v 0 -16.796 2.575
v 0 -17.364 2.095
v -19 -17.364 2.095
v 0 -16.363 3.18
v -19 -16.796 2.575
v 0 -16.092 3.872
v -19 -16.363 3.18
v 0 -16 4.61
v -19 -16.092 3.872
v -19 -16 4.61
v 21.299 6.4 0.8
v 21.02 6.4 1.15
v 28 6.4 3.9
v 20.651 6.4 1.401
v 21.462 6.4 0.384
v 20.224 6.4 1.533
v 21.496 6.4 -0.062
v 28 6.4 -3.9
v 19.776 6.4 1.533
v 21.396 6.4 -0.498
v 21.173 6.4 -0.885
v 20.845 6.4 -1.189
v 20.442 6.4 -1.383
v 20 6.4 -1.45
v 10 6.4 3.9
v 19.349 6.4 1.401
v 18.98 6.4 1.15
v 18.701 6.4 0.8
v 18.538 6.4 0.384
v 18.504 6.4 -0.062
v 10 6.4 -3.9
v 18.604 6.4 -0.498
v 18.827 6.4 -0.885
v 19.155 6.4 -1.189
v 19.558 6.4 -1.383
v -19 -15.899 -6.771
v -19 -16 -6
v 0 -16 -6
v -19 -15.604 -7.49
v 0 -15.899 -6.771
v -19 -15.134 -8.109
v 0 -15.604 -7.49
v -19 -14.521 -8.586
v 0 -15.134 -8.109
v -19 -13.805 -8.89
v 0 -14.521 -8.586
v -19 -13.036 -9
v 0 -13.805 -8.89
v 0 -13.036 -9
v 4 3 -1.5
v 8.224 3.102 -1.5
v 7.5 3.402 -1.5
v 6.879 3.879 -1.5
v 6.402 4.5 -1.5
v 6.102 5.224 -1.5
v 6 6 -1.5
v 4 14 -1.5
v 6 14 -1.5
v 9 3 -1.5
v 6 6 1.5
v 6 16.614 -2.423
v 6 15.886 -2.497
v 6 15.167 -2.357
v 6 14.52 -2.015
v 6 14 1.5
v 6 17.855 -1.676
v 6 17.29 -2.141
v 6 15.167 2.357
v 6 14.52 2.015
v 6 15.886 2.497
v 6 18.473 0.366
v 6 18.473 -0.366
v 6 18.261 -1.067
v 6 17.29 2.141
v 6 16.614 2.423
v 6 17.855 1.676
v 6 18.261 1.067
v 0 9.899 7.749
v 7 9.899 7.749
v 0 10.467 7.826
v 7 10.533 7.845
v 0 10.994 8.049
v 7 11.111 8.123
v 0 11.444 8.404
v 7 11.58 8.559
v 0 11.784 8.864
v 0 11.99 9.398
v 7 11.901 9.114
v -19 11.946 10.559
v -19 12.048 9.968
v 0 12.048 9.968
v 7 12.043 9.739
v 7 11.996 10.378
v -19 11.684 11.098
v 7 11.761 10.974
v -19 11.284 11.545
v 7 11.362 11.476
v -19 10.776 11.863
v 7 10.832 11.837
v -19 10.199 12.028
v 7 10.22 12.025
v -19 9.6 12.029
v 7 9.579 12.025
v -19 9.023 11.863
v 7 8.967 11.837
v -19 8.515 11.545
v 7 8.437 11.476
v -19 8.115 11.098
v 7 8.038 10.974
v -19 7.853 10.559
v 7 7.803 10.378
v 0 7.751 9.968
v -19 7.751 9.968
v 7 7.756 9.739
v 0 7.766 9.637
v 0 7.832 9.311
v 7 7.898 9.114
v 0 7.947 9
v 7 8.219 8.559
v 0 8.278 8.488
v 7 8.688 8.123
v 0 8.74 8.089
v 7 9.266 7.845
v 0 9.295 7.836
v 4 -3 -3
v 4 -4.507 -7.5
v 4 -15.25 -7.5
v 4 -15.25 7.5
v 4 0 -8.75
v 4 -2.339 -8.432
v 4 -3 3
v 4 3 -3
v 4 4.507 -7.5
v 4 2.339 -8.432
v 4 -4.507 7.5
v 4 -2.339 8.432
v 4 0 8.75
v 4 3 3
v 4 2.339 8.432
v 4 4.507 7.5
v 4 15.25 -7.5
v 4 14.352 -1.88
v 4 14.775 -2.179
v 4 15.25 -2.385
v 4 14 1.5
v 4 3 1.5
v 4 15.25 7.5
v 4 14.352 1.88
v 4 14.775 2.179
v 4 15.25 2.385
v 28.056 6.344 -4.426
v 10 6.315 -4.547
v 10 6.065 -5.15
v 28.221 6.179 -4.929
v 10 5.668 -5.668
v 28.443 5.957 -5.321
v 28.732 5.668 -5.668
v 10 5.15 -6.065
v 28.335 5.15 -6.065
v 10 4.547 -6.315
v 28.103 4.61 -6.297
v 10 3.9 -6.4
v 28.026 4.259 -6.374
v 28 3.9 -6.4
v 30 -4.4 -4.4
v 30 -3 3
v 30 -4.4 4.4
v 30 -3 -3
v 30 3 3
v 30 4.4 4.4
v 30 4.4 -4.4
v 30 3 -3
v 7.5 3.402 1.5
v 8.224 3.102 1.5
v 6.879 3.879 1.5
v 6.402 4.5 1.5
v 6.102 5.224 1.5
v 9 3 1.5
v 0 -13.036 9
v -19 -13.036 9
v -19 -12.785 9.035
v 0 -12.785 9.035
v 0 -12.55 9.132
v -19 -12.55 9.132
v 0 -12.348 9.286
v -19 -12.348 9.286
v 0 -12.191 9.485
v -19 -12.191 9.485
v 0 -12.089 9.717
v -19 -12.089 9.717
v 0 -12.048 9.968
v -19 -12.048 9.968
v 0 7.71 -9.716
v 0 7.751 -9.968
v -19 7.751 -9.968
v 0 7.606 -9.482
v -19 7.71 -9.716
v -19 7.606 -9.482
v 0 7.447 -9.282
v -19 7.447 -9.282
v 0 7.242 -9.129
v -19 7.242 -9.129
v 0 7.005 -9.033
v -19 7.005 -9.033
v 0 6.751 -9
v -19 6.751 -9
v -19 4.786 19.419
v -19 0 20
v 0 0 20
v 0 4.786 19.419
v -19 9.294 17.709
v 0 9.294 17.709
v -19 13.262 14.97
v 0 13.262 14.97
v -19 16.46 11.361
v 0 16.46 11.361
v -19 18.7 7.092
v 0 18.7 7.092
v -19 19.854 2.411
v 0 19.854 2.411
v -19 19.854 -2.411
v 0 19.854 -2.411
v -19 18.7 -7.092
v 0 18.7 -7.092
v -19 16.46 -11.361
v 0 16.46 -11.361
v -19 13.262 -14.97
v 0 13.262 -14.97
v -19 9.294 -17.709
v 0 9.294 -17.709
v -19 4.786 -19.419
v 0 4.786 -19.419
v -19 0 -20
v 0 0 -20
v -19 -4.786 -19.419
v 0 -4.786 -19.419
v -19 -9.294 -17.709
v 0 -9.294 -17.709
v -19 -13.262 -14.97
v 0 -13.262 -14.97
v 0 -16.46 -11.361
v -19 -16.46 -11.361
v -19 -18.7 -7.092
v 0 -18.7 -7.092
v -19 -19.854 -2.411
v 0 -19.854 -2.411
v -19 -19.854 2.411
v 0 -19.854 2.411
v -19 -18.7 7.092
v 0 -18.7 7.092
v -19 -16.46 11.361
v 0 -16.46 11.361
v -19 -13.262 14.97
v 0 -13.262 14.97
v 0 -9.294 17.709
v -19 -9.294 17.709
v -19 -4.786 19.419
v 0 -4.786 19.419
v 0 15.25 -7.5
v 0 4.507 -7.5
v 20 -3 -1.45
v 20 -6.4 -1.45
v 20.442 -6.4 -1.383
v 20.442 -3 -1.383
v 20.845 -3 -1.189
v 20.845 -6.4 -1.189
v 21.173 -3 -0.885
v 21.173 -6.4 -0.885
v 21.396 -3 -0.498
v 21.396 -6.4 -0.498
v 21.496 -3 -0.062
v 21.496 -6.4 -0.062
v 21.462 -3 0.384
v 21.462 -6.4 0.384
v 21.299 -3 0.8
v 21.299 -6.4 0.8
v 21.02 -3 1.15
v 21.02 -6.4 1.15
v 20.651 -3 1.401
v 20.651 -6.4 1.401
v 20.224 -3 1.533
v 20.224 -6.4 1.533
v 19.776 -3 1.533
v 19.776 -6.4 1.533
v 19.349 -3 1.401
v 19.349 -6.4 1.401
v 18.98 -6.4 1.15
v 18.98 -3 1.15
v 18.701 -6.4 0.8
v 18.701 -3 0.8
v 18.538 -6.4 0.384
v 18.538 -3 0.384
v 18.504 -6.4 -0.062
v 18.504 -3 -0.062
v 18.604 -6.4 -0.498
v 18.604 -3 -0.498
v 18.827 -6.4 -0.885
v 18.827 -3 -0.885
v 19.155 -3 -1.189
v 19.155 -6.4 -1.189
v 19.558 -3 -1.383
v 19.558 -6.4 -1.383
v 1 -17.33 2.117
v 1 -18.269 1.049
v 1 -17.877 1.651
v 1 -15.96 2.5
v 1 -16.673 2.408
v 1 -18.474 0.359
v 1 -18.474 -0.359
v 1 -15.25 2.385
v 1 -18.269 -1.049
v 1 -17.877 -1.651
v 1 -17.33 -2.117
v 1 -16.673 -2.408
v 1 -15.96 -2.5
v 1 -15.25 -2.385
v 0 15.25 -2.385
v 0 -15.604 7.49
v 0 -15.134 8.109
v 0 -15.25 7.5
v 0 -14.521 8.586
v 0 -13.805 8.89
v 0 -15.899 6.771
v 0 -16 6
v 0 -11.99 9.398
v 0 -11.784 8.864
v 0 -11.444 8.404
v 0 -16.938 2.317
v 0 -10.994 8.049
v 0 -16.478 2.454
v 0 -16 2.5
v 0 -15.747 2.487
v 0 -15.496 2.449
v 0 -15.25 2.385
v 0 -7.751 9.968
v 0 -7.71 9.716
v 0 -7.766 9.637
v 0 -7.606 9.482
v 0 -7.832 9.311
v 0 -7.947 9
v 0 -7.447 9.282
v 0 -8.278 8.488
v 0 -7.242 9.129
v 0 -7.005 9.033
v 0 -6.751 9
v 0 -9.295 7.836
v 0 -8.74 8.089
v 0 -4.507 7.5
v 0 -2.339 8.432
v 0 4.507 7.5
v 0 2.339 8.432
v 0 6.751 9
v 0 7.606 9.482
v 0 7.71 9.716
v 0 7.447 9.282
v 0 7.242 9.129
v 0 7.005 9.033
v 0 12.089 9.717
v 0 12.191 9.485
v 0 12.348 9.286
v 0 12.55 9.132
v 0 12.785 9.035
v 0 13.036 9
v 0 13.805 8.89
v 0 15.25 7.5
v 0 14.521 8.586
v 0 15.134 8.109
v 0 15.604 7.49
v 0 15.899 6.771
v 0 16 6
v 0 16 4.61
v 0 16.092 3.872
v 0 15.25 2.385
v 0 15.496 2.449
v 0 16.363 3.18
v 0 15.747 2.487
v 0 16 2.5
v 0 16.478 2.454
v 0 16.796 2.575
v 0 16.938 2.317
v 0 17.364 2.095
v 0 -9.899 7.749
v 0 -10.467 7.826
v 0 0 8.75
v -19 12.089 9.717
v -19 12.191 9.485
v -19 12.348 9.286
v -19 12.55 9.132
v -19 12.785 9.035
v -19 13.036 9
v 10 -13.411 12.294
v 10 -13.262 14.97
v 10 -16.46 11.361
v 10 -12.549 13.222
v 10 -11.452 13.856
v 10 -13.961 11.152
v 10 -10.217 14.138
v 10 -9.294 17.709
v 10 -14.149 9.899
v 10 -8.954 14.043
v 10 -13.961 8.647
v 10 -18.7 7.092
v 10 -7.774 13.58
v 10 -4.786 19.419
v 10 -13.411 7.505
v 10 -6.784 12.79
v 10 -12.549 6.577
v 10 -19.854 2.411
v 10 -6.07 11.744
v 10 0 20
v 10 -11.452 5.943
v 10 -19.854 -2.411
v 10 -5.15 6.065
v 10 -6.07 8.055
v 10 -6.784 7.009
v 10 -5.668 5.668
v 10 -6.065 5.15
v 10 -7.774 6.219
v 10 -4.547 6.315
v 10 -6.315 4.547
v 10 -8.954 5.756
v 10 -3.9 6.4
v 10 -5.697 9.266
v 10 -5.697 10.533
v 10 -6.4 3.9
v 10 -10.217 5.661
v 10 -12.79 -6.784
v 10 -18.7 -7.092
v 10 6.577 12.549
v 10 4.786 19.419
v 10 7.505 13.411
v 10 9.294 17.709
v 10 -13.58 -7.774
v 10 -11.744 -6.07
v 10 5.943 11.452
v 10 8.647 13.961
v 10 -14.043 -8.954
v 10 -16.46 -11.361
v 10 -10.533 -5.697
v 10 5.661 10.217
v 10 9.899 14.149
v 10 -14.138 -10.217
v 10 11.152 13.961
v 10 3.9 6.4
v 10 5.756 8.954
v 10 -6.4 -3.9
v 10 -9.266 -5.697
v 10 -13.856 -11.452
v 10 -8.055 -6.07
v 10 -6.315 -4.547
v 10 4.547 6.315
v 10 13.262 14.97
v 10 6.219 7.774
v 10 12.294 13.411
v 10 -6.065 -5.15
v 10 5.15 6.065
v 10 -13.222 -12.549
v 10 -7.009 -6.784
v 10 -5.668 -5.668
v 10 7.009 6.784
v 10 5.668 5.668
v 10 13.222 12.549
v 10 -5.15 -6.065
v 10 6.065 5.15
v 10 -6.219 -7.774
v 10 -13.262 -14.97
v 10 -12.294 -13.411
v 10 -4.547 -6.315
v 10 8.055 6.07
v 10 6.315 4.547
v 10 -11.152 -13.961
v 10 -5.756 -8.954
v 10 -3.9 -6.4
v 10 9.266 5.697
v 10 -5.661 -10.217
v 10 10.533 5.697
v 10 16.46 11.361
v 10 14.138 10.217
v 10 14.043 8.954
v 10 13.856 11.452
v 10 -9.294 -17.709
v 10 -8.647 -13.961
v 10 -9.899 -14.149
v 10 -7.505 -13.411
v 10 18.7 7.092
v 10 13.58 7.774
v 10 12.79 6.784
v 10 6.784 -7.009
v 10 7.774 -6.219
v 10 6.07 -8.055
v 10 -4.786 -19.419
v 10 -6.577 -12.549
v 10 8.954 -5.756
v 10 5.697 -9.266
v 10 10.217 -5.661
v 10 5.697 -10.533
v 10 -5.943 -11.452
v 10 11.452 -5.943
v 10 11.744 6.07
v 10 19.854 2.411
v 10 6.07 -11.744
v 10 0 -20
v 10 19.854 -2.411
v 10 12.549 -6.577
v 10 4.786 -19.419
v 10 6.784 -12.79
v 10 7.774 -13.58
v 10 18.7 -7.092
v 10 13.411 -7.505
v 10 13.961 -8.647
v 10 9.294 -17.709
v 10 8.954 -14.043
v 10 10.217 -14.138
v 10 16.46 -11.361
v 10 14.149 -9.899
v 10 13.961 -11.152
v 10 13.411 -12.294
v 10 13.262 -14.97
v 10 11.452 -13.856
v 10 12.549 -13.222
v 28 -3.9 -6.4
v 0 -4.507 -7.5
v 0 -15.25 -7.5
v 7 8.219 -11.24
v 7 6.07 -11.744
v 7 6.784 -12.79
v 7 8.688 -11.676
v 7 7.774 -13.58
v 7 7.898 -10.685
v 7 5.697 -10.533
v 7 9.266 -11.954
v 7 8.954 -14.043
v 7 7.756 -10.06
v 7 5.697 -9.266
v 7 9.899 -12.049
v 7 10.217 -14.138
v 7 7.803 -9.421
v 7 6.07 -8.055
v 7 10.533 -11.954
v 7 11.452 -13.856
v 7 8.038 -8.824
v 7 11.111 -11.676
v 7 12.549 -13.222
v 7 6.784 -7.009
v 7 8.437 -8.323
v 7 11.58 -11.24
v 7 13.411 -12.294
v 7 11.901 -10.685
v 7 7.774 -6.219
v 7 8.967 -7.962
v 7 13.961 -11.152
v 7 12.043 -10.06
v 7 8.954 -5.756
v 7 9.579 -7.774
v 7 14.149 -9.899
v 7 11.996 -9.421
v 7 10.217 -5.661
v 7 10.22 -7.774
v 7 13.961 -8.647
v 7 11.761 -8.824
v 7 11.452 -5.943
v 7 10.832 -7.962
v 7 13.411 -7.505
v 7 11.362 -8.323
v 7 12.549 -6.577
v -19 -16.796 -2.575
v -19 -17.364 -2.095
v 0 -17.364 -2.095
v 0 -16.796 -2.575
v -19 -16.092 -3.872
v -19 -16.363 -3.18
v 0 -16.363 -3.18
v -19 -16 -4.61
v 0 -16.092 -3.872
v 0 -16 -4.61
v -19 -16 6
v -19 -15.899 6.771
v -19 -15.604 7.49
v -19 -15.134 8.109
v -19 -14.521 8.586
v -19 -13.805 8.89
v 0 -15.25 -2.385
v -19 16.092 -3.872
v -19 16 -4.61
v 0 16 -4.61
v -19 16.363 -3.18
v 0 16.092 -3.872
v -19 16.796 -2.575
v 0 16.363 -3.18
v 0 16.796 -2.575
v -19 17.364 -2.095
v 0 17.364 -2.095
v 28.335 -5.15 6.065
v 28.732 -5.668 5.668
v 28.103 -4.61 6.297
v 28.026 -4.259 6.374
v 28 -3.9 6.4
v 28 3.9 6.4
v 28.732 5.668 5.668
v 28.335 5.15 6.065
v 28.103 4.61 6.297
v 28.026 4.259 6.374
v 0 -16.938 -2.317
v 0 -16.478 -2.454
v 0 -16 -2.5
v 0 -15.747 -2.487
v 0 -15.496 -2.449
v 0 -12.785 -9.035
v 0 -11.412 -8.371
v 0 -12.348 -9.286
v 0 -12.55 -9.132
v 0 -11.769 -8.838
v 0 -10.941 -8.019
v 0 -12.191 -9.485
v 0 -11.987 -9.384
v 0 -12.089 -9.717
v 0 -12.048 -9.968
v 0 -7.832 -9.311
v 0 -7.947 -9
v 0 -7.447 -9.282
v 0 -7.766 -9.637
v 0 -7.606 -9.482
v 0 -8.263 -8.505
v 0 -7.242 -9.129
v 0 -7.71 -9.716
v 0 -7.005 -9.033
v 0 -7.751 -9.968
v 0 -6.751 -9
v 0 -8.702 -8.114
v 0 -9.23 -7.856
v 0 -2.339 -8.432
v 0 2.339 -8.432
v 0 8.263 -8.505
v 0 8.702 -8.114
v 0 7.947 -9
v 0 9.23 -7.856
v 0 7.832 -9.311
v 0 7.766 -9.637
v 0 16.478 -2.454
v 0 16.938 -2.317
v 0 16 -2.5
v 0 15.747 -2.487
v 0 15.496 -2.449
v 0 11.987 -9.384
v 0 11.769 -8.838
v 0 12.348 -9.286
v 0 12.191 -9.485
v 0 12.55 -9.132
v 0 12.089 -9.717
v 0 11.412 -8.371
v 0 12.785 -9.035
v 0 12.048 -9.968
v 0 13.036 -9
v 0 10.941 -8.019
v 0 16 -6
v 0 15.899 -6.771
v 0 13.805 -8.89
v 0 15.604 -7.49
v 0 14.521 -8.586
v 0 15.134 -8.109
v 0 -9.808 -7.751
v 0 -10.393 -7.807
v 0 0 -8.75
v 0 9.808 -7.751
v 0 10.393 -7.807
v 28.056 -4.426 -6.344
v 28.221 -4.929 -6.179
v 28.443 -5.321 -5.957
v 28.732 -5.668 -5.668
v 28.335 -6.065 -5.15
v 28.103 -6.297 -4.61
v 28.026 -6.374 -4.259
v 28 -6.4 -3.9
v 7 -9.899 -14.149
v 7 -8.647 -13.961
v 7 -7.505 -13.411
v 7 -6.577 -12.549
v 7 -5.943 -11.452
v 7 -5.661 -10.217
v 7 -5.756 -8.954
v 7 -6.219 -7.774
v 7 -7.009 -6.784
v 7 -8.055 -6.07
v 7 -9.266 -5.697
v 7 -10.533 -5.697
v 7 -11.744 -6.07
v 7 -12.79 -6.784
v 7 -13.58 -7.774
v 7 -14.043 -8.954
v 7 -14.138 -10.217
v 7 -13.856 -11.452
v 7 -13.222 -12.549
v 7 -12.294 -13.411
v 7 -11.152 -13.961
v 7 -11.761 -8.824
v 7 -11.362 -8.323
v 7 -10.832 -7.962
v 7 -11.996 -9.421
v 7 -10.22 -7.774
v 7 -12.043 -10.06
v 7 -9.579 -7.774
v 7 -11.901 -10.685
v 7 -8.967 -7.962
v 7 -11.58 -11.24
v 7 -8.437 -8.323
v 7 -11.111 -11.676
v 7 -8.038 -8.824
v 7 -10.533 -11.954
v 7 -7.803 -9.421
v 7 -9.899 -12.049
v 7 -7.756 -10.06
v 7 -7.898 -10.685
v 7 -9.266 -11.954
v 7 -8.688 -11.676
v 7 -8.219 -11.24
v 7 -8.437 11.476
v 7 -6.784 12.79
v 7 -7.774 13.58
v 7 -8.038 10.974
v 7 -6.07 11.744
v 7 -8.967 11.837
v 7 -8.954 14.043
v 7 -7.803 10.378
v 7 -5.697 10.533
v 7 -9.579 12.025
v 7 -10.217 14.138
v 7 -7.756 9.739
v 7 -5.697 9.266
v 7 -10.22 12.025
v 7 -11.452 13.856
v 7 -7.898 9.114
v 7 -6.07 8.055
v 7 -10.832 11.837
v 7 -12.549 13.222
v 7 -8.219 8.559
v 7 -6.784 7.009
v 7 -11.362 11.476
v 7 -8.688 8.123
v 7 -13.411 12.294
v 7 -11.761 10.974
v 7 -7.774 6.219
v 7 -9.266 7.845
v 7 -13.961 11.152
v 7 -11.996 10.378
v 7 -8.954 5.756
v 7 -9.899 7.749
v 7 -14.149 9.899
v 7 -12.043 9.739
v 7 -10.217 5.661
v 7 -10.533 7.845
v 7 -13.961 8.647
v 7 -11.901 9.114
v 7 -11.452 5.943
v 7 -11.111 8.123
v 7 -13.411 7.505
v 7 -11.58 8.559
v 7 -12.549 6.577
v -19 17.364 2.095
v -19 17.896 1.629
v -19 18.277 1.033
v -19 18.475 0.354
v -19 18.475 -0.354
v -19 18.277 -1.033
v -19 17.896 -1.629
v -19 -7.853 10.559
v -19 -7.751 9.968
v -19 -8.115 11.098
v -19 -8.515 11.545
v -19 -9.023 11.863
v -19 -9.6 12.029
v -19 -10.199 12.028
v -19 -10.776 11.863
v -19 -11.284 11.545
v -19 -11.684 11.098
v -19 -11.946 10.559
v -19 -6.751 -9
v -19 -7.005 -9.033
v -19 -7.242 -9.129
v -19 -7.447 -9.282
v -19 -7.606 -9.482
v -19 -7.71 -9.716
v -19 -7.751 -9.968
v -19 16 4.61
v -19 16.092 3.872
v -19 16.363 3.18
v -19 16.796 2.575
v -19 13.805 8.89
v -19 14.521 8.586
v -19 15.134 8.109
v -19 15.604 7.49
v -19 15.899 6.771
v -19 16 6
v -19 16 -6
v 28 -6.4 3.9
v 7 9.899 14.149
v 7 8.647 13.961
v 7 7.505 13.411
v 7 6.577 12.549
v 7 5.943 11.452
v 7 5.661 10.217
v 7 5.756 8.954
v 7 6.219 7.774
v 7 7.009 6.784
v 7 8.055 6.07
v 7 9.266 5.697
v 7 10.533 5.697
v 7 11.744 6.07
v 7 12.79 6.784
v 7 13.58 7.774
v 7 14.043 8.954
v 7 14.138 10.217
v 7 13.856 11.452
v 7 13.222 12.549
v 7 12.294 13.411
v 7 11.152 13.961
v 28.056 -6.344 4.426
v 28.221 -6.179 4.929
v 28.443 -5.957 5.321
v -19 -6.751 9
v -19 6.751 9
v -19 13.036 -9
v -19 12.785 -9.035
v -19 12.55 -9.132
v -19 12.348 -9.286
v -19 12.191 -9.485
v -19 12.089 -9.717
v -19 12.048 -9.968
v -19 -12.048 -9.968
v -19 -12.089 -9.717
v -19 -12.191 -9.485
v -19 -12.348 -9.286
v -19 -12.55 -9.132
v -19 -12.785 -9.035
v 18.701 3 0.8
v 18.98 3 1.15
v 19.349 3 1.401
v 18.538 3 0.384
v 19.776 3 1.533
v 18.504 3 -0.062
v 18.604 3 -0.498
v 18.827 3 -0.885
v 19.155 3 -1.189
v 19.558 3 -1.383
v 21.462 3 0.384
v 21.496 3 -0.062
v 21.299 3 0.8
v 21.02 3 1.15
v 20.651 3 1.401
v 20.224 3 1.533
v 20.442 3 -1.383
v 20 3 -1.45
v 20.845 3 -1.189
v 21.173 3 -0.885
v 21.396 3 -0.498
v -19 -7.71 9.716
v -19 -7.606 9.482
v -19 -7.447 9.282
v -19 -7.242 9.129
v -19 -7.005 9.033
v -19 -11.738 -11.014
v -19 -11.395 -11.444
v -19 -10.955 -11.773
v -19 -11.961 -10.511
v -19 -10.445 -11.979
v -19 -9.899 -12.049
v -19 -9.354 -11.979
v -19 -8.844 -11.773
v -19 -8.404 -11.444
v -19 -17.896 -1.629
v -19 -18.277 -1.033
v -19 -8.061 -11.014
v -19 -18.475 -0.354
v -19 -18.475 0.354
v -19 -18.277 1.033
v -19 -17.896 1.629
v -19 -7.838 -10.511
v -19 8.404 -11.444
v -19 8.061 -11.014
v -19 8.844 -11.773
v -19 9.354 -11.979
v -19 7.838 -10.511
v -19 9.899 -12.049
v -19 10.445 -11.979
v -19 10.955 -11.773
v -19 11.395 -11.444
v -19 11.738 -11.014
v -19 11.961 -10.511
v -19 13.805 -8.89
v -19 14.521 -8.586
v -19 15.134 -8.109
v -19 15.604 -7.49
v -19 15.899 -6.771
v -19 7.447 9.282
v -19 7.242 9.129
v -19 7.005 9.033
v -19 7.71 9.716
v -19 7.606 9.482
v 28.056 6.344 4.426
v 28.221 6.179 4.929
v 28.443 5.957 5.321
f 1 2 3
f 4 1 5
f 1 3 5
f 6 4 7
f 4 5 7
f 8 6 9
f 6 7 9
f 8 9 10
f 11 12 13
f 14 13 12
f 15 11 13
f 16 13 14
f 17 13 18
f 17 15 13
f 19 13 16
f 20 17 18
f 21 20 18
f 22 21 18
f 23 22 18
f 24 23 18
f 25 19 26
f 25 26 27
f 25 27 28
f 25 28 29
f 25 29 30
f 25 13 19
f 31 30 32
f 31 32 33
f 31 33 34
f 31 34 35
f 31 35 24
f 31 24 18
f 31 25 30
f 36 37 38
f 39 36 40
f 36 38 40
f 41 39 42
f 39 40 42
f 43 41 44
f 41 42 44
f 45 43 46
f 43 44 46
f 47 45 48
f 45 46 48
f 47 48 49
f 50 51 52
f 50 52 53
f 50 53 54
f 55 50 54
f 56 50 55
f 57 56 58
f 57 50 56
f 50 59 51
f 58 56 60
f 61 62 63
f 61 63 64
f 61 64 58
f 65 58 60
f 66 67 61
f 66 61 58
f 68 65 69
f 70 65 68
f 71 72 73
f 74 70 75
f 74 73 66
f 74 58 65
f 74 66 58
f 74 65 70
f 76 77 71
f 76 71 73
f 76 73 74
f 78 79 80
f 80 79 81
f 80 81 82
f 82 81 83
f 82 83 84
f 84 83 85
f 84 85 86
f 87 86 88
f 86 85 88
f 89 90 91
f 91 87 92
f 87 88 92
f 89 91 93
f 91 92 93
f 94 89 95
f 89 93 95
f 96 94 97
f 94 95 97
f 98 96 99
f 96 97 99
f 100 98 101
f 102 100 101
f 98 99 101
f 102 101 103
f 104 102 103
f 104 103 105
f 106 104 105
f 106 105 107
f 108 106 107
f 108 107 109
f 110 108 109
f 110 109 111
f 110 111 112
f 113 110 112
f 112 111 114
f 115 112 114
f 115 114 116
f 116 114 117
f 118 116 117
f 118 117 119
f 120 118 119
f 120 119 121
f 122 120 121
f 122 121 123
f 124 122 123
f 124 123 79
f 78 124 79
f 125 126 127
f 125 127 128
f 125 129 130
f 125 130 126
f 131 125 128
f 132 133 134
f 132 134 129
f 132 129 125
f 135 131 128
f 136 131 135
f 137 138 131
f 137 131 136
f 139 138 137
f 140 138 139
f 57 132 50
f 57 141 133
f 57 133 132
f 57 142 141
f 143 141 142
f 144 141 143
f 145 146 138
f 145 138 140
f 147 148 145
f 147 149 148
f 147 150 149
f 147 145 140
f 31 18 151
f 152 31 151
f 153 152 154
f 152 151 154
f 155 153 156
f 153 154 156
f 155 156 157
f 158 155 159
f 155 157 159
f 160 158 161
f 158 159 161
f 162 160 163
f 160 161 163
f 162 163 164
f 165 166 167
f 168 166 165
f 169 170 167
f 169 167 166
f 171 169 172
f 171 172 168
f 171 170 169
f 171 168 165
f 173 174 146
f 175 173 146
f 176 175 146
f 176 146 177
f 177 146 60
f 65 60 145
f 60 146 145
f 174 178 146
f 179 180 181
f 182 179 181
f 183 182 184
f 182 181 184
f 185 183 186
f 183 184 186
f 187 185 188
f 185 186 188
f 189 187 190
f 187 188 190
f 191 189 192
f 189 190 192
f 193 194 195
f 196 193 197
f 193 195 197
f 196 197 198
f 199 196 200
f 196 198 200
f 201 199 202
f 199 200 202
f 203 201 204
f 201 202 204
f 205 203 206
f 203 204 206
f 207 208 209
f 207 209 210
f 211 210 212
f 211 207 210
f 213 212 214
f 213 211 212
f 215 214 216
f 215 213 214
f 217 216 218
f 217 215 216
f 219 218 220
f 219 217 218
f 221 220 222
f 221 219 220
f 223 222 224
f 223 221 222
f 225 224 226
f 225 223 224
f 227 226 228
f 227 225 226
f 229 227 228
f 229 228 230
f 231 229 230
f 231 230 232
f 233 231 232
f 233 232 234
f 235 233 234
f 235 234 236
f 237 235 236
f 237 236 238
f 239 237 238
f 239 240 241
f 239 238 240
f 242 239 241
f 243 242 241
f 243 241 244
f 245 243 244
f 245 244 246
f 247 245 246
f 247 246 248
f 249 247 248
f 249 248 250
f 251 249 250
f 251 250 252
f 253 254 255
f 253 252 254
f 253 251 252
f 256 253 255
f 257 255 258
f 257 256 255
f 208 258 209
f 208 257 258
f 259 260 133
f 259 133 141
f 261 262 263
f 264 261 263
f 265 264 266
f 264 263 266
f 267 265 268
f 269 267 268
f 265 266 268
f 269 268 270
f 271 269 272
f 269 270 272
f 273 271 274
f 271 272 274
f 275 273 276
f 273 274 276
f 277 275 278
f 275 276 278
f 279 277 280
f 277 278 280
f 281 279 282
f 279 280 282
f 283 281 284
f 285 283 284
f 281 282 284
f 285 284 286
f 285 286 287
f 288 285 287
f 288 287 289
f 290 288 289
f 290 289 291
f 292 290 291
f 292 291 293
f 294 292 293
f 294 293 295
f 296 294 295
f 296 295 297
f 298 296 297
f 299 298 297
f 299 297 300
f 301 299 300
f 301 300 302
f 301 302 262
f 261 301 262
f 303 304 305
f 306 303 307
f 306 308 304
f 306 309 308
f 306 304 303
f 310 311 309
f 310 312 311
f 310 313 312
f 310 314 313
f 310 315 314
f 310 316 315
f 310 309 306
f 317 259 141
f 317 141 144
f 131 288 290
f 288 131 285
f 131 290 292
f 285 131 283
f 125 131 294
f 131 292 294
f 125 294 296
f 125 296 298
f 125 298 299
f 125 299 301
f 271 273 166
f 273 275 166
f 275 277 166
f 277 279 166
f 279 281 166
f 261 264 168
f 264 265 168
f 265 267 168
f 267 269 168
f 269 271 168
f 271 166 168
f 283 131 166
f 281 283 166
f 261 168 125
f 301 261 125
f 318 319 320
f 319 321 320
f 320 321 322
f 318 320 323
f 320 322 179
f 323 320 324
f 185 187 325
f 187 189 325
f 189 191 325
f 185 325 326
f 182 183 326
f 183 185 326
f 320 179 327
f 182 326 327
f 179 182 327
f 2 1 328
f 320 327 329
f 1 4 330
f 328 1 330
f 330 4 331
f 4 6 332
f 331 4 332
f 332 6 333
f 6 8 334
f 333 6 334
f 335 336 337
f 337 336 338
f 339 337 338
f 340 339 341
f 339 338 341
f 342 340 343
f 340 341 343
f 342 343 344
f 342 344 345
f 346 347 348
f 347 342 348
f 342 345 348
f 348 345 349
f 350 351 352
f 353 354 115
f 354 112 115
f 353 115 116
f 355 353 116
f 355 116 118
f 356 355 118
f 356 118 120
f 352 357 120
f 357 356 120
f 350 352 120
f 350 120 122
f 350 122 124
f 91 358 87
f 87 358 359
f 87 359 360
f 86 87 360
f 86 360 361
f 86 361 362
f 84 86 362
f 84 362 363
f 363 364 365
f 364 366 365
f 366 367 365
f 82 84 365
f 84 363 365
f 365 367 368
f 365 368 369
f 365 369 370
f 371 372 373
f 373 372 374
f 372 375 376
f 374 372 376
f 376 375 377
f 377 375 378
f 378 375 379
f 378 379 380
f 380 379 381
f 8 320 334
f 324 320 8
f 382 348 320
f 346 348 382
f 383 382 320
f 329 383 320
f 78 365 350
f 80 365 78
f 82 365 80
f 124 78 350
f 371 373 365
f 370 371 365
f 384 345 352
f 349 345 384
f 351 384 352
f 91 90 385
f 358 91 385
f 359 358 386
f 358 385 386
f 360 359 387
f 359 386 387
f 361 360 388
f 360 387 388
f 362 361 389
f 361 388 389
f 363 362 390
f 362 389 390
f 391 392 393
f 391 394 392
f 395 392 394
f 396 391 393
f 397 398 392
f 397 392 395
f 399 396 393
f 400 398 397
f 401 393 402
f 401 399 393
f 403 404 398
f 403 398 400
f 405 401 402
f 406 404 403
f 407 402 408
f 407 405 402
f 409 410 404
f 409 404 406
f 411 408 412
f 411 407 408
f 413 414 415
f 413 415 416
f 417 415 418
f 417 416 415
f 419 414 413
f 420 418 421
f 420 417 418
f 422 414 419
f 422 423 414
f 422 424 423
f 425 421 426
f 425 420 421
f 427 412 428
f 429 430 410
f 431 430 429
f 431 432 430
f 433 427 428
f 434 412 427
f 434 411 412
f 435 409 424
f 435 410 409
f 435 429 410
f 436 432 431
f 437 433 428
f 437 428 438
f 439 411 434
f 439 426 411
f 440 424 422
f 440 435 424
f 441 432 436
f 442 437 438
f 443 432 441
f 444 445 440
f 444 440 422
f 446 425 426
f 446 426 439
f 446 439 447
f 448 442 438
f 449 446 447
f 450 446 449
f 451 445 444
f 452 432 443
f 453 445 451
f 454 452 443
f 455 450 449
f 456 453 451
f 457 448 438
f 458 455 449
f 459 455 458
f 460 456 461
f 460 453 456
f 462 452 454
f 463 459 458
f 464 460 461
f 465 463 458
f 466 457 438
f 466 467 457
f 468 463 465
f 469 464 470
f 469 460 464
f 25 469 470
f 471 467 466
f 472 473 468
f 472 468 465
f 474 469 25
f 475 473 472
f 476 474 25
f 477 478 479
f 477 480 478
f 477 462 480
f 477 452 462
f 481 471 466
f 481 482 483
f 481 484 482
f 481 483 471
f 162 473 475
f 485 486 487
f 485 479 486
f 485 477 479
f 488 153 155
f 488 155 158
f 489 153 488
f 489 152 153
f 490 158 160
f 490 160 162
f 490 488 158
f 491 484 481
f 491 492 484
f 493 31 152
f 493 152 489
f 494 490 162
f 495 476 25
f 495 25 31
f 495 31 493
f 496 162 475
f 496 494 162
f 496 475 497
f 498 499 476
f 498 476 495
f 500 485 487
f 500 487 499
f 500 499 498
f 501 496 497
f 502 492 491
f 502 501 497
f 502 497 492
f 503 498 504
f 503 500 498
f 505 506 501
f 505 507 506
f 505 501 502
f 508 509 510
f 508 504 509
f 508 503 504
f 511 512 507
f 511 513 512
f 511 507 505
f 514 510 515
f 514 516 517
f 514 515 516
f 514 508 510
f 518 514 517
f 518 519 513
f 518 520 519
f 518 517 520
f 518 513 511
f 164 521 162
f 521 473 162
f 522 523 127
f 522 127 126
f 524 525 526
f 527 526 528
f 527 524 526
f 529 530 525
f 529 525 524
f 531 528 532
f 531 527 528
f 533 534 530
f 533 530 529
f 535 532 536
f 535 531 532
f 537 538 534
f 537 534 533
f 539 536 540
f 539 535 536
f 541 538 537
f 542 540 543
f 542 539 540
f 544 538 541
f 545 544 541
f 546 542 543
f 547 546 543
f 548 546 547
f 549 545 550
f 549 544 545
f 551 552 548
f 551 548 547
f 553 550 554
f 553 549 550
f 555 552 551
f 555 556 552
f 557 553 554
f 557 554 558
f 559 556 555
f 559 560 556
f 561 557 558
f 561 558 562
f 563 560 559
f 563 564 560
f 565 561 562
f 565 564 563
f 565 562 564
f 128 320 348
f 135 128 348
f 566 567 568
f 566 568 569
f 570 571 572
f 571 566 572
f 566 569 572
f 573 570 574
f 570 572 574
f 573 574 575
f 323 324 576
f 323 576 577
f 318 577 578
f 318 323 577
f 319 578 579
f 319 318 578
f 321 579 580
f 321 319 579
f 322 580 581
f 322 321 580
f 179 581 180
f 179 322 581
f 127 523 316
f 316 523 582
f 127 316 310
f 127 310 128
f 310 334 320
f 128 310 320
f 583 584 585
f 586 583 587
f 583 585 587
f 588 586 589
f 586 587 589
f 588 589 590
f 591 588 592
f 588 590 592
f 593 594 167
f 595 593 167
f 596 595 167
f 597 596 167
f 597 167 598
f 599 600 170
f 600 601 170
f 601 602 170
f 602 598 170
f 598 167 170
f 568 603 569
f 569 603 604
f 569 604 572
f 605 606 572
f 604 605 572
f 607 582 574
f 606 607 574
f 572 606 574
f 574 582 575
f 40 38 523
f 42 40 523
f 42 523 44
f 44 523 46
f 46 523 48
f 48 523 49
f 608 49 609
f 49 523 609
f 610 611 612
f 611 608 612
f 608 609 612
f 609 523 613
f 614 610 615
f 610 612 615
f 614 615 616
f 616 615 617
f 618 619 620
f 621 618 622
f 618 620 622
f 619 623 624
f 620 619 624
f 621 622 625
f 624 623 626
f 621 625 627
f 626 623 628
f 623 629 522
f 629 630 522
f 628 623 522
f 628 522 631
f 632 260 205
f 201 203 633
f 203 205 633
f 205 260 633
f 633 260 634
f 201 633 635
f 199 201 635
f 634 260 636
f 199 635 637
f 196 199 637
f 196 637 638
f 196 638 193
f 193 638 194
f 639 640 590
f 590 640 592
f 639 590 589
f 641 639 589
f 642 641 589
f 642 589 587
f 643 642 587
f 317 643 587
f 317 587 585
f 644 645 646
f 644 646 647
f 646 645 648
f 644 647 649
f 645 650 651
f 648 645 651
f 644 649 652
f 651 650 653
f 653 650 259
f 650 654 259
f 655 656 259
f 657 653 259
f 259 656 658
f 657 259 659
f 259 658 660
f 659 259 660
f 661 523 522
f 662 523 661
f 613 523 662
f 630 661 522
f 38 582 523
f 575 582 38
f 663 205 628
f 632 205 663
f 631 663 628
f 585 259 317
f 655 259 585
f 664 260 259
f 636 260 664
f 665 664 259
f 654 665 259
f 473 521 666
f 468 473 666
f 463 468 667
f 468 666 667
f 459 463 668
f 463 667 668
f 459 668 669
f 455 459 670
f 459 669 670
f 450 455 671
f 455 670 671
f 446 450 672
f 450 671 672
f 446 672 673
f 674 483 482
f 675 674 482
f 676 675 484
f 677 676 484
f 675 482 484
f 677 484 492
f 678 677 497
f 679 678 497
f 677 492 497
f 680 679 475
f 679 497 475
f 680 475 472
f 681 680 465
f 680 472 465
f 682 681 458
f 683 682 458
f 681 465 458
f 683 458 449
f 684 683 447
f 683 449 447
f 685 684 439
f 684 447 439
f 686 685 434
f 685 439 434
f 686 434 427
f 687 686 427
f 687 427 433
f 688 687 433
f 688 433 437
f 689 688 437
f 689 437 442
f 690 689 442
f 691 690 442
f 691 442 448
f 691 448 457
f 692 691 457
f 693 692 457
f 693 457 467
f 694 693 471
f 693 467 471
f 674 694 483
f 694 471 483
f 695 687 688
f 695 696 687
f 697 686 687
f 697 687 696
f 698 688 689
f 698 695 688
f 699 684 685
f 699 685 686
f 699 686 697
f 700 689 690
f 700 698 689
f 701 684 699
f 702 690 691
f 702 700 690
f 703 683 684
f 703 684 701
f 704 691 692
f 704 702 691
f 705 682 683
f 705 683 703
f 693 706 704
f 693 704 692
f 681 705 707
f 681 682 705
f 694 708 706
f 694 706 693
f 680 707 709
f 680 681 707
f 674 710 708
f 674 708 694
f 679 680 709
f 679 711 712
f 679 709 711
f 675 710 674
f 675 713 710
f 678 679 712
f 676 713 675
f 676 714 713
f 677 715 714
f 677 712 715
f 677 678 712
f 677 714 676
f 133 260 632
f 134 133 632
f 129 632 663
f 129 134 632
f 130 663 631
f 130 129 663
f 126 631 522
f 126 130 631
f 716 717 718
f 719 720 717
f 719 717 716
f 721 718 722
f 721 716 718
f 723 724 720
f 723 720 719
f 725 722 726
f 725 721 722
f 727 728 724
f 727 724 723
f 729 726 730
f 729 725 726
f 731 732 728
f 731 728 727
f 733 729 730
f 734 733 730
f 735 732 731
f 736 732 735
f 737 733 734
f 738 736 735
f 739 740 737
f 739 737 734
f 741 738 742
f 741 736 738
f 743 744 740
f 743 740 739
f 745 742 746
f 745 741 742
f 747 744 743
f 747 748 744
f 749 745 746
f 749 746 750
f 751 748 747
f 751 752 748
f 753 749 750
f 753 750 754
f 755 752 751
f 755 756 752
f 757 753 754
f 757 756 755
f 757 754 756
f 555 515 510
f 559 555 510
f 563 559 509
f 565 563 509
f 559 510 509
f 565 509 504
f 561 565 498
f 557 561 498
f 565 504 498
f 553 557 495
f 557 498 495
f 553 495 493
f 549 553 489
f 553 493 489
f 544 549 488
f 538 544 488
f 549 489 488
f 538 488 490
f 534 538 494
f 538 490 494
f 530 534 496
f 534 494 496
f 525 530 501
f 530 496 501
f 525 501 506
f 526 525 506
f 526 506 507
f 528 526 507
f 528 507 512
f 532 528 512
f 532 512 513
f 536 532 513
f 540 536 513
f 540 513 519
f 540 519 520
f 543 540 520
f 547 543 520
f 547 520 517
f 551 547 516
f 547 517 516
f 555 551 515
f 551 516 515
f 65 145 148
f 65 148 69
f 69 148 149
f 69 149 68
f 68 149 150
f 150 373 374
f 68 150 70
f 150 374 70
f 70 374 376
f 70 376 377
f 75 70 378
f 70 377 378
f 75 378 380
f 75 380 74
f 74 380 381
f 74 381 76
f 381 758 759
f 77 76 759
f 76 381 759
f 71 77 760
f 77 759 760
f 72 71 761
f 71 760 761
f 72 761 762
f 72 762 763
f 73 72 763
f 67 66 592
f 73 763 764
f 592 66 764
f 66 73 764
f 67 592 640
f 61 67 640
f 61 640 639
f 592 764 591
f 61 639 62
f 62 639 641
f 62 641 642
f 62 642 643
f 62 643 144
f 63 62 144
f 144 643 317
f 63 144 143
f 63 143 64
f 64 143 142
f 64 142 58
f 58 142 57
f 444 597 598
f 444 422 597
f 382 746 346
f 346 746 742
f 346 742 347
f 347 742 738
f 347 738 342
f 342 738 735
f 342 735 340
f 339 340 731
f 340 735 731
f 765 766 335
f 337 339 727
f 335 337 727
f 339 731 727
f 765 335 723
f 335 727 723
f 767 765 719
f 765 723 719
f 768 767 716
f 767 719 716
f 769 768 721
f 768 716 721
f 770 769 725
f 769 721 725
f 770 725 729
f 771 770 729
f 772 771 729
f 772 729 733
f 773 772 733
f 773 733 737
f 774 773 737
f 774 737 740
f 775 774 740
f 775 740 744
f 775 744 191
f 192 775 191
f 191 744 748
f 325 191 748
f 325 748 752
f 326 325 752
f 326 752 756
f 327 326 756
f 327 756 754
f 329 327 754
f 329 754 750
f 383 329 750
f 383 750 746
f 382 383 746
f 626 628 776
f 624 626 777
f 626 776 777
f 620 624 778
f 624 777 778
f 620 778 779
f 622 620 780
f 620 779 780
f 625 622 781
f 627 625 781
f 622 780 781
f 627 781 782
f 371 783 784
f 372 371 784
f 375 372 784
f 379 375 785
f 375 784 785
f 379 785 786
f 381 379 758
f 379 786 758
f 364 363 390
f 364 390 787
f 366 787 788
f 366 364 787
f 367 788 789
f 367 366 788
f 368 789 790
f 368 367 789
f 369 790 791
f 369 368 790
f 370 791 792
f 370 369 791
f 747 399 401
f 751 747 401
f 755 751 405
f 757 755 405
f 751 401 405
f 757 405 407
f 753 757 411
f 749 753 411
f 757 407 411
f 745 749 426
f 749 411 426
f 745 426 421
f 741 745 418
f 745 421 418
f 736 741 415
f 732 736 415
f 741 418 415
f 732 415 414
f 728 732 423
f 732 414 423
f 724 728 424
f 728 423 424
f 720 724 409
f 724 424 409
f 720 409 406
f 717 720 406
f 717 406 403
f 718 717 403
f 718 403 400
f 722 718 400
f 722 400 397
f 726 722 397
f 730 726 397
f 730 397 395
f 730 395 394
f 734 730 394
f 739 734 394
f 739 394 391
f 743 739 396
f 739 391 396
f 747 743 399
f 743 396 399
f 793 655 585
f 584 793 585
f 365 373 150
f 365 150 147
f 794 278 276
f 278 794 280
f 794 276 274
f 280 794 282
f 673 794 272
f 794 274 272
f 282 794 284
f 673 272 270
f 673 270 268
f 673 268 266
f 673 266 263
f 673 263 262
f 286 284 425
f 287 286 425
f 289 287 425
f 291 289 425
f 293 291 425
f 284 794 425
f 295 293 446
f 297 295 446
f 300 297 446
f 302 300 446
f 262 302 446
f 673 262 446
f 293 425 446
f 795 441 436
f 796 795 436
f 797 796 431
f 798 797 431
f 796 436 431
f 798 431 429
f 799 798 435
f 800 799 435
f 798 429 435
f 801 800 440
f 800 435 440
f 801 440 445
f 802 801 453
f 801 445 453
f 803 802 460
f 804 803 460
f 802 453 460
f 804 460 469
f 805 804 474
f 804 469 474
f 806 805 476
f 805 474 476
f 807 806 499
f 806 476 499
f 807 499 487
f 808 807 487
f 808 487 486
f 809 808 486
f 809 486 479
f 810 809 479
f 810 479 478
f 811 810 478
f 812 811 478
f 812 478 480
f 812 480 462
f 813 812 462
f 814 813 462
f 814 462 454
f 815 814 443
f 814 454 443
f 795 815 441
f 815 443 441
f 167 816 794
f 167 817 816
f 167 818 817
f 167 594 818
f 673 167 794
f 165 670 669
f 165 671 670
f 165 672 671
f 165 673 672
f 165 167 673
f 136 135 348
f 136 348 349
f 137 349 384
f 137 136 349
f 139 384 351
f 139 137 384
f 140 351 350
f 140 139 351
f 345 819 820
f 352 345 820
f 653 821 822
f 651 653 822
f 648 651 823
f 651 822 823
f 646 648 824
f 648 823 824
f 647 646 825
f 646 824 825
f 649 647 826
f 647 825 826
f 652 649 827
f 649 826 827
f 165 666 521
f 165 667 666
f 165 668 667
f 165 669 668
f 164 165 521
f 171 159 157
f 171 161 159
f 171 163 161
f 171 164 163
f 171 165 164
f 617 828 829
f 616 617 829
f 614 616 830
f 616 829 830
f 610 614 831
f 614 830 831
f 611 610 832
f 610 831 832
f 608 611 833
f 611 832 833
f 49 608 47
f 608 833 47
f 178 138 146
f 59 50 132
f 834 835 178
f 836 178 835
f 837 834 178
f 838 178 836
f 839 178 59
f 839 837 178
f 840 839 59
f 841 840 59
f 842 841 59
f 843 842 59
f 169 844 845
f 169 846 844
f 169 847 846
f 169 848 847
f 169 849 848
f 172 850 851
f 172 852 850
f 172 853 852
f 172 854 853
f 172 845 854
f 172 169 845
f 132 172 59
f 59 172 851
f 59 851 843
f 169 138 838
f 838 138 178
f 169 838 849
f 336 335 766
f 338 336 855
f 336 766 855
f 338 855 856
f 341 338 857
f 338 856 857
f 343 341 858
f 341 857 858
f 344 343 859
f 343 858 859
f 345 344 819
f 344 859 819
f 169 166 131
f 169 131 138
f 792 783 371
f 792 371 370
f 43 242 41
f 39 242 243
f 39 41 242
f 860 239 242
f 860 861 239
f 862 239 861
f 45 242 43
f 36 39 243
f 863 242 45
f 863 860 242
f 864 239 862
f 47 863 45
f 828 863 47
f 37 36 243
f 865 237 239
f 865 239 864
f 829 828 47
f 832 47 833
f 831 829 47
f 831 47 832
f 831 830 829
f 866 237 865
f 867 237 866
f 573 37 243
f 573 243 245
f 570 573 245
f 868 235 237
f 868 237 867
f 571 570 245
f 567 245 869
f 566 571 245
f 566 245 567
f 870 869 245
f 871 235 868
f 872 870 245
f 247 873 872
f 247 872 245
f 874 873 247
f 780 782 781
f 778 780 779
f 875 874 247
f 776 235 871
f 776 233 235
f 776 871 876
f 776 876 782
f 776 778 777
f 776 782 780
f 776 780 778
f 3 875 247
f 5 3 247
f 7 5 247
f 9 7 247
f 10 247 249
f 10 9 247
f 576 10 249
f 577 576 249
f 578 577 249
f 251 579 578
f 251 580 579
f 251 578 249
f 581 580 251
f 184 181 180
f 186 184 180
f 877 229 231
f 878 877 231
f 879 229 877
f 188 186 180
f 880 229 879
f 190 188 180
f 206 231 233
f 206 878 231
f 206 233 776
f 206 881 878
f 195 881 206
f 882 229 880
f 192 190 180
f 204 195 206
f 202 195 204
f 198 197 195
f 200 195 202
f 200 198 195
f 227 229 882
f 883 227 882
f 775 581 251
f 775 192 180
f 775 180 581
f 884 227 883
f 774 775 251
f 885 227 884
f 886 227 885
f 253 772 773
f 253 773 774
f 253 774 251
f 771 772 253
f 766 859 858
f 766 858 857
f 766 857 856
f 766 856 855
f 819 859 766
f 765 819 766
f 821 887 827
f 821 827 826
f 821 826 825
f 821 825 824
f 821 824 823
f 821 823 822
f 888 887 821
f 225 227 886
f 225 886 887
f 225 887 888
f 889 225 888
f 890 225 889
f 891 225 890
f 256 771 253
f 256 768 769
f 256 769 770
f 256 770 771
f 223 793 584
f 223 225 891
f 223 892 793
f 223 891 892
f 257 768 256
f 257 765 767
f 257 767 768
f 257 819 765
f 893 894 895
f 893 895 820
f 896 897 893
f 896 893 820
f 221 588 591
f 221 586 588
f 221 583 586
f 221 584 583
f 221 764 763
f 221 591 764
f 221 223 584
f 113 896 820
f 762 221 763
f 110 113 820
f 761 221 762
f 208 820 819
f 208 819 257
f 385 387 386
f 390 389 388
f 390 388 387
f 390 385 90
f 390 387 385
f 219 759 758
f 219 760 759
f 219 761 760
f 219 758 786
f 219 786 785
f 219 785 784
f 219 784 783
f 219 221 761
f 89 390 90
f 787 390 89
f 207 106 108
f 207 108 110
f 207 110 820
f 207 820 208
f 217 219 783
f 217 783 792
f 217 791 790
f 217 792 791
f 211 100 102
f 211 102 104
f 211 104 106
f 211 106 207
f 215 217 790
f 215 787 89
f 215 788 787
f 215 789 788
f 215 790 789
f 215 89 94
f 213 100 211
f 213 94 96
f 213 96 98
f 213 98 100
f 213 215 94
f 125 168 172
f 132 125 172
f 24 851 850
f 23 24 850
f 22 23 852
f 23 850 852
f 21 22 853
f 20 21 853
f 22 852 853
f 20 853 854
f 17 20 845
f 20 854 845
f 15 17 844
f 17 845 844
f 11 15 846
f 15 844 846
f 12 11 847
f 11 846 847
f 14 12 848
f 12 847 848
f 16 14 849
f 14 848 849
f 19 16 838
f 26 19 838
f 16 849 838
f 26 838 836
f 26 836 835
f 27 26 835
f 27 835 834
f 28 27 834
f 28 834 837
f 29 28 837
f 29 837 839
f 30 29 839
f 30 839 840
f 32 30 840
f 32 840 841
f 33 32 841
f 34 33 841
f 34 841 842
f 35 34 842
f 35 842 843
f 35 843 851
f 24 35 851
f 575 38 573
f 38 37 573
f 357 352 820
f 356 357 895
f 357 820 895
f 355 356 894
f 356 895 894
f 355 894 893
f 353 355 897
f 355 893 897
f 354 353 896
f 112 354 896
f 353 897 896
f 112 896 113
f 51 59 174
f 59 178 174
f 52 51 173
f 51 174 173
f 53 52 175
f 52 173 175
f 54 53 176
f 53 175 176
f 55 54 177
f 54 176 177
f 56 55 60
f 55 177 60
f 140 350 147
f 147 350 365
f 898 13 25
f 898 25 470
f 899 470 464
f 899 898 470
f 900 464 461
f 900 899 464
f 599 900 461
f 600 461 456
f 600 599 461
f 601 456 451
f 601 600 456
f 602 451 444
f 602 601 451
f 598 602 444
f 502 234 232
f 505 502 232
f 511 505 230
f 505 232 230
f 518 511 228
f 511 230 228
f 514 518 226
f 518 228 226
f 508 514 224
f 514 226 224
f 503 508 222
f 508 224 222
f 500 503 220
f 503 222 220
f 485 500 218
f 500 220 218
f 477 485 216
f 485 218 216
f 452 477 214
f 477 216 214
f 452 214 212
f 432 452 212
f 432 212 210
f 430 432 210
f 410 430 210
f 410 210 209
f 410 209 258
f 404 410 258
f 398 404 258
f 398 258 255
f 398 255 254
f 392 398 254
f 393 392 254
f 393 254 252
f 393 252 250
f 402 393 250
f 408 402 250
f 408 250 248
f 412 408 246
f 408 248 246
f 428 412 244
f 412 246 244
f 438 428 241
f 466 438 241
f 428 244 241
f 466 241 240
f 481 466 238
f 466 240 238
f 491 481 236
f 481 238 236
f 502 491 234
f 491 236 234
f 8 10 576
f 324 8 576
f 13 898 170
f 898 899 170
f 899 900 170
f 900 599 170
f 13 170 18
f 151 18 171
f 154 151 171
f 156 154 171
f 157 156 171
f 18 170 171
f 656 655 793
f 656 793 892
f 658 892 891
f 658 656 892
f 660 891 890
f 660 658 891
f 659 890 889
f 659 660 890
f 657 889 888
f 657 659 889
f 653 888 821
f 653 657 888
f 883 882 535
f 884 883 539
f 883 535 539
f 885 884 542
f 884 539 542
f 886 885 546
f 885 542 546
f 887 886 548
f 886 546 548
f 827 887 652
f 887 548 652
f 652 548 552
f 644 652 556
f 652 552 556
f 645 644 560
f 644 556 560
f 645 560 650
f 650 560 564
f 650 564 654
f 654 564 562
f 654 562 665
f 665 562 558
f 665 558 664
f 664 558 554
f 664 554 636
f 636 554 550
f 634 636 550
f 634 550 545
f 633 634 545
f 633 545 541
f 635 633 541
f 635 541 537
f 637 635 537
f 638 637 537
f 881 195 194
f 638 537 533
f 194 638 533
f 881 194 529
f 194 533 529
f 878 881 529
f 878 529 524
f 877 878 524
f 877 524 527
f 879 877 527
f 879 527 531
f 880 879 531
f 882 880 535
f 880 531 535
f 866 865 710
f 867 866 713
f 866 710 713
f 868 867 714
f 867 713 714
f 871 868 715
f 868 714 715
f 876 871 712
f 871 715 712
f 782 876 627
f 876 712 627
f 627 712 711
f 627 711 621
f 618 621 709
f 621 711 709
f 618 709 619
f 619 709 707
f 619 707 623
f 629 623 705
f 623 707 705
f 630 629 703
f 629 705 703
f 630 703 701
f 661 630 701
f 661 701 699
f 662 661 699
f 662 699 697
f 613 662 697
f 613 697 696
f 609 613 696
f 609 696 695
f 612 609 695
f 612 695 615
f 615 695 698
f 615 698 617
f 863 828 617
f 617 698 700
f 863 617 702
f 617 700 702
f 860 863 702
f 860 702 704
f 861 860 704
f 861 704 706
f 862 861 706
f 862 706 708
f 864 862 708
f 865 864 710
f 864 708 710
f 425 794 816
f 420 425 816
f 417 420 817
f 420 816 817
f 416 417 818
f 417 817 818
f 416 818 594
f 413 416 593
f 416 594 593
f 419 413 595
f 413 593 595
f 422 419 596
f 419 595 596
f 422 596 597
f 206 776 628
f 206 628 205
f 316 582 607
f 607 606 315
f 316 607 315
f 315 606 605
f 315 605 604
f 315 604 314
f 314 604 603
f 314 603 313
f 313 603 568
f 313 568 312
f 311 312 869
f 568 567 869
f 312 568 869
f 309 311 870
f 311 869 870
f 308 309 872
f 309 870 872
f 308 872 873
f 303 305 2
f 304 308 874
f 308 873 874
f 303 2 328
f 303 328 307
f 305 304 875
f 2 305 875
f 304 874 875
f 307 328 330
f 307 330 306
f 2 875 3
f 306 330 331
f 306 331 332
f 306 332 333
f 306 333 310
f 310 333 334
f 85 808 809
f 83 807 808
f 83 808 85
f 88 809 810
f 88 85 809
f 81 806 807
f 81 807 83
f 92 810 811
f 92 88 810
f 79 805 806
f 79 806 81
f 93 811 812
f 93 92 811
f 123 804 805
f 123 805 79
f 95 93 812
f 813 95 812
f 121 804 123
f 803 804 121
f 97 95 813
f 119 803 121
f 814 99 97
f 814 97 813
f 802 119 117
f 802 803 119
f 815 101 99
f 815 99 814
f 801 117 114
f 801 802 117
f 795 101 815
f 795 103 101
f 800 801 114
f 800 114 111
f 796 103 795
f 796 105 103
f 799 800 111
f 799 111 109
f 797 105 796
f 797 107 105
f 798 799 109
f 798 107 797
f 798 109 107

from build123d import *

# Parameters (mm, degrees)
SKETCH_1_R               = 20
EXTRUDE_1_DEPTH          = 10
SKETCH_2_W               = 15
SKETCH_2_H               = 30.5
CUT_EXTRUDE_1_DEPTH      = 4
SKETCH_3_R               = 8.75
CUT_EXTRUDE_2_DEPTH      = 4
EXTRUDE_START            = 19
SKETCH_4_R               = 20
SKETCH_4_W               = 18
SKETCH_4_H               = 32
EXTRUDE_2_DEPTH          = 19
FILLET_1_R               = 3
SKETCH_5_R               = 2.5
CUT_EXTRUDE_3_DEPTH      = 20
FILLET_2_R               = 3
SKETCH_6_R               = 2.15
CUT_EXTRUDE_4_DEPTH      = 43
FILLET_3_R               = 1
SKETCH_7_R               = 4.25
CUT_EXTRUDE_5_DEPTH      = 3
PATTERN_CIRCULAR_1_COUNT = 4
SKETCH_8_W               = 12.8
SKETCH_8_H               = 12.8
EXTRUDE_3_DEPTH          = 20
SKETCH_9_W               = 6
SKETCH_9_H               = 6
CUT_EXTRUDE_6_DEPTH      = 35
SKETCH_10_W              = 3
SKETCH_10_H              = 15
CUT_EXTRUDE_7_DEPTH      = 5
SKETCH_11_R              = 2.5
CUT_EXTRUDE_8_DEPTH      = 5
SKETCH_12_R              = 1.5
CUT_EXTRUDE_9_DEPTH      = 17
CHAMFER_1_SIZE           = 2
FILLET_4_R               = 3
FILLET_5_R               = 2.5


with BuildPart() as part:
    # 草图1 → 凸台-拉伸1 (new body)
    with BuildSketch(Plane(origin=(0, 0, 0), x_dir=(0, 0, -1), z_dir=(1, 0, 0))):
        Circle(SKETCH_1_R)
    extrude(amount=EXTRUDE_1_DEPTH)

    # 草图2 → 切除-拉伸1 (cut)
    with BuildSketch(Plane.ZY):
        Rectangle(SKETCH_2_W, SKETCH_2_H)
    extrude(amount=-CUT_EXTRUDE_1_DEPTH, mode=Mode.SUBTRACT)

    # 草图3 → 切除-拉伸2 (cut)
    with BuildSketch(Plane.ZY.offset(-4)):
        Circle(SKETCH_3_R)
    extrude(amount=CUT_EXTRUDE_2_DEPTH, mode=Mode.SUBTRACT)

    # 草图4 → 凸台-拉伸2 (add)
    with BuildSketch(Plane.ZY.offset(EXTRUDE_START)):
        Circle(SKETCH_4_R)
        Rectangle(SKETCH_4_W, SKETCH_4_H, mode=Mode.SUBTRACT)
    extrude(amount=-EXTRUDE_2_DEPTH)

    # 圆角1
    fillet_1_edges = [part.edges().sort_by_distance(p)[0] for p in [
        (-9.5, 16, 9),
        (-9.5, 16, -9),
        (-9.5, -16, -9),
        (-9.5, -16, 9),
    ]]
    fillet(fillet_1_edges, radius=FILLET_1_R)

    # 草图5 → 切除-拉伸3 (cut)
    with BuildSketch(Plane.ZY.offset(19)):
        with Locations((0, -16)):
            Circle(SKETCH_5_R)
        with Locations((0, 16)):
            Circle(SKETCH_5_R)
    extrude(amount=-CUT_EXTRUDE_3_DEPTH, mode=Mode.SUBTRACT)

    # 圆角2
    # the kernel refuses this fillet: 3 mm, written as the material it takes off along each edge
    with BuildSketch(Plane(origin=(-24.274430572, -16, 2.5), x_dir=(0, -0.9586814917396833, -0.2844816292764363), z_dir=(1, 0, 0))) as fillet_2_piece_1:
        with BuildLine():
            CenterArc((2.275853034, -2.876044475), FILLET_2_R, 106.527865575, 56.944268849)
            Line((-0.600191441, -2.022599587), (0, 0))
            ThreePointArc((0, 0), (0.711204073, -0.103296271), (1.422408146, 0))
        make_face()
    extrude(amount=24.274430572, mode=Mode.SUBTRACT)
    with BuildSketch(Plane(origin=(0, -16, -2.5), x_dir=(0, 0, -1), z_dir=(-1, 0, 0))) as fillet_2_piece_2:
        with BuildLine():
            CenterArc((2.109772229, 3), FILLET_2_R, 213.055731151, 56.944268849)
            ThreePointArc((-0.404648987, 1.363636364), (-0.103296271, 0.711204073), (0, 0))
            Line((0, 0), (2.109772229, 0))
        make_face()
    extrude(amount=24.274430572, mode=Mode.SUBTRACT)
    with BuildSketch(Plane(origin=(0, 16, -2.5), x_dir=(0, 0.9586814917396834, 0.2844816292764354), z_dir=(-1, 0, 0))) as fillet_2_piece_3:
        with BuildLine():
            CenterArc((2.275853034, 2.876044475), FILLET_2_R, 196.527865575, 56.944268849)
            Line((-0.600191441, 2.022599587), (0, 0))
            ThreePointArc((0, 0), (0.711204073, 0.103296271), (1.422408146, 0))
        make_face()
    extrude(amount=24.274430572, mode=Mode.SUBTRACT)
    with BuildSketch(Plane(origin=(-24.274430572, 16, 2.5), x_dir=(0, 0, 1), z_dir=(1, 0, 0))) as fillet_2_piece_4:
        with BuildLine():
            CenterArc((2.109772229, -3), FILLET_2_R, 90, 56.944268849)
            ThreePointArc((-0.404648987, -1.363636364), (-0.103296271, -0.711204073), (0, 0))
            Line((0, 0), (2.109772229, 0))
        make_face()
    extrude(amount=24.274430572, mode=Mode.SUBTRACT)

    # 草图6 → 切除-拉伸4 (cut)
    with BuildSketch(Plane(origin=(10, 0, 0), x_dir=(0, 0, -1), z_dir=(1, 0, 0))):
        with Locations((9.899494937, -9.899494937)):
            Circle(SKETCH_6_R)
        with Locations((-9.899494937, -9.899494937)):
            Circle(SKETCH_6_R)
        with Locations((-9.899494937, 9.899494937)):
            Circle(SKETCH_6_R)
        with Locations((9.899494937, 9.899494937)):
            Circle(SKETCH_6_R)
    extrude(amount=-CUT_EXTRUDE_4_DEPTH, mode=Mode.SUBTRACT)

    # 圆角3
    # the kernel refuses this fillet: 1 mm, written as the material it takes off along each edge
    with BuildSketch(Plane(origin=(-21.98900269, -7.946699797, 9), x_dir=(0, 0.1985408891964352, 0.9800926054802622), z_dir=(1, 0, 0)), Plane(origin=(-21.98900269, 7.946699797, -9), x_dir=(0, -0.19854088919647347, -0.9800926054802545), z_dir=(1, 0, 0))) as fillet_3_piece_1:
        with BuildLine():
            CenterArc((1.217468306, -0.973258884), FILLET_3_R, 103.280057781, 88.171589383)
            Line((0.237375701, -1.171799774), (0, 0))
            ThreePointArc((0, 0), (0.493878653, -0.057493399), (0.987757305, 0))
        make_face()
    extrude(amount=21.98900269, mode=Mode.SUBTRACT)
    with BuildSketch(Plane(origin=(-21.959087911, -11.852290077, 9), x_dir=(0, -0.999999983485678, -0.00018173784322620402), z_dir=(1, 0, 0)), Plane(origin=(-21.959087911, 11.852290077, -9), x_dir=(0, 0.9999999834856781, 0.00018173784322619477), z_dir=(1, 0, 0))) as fillet_3_piece_2:
        with BuildLine():
            CenterArc((1.195428513, -0.999930456), FILLET_3_R, 90.675724778, 87.490671362)
            Line((0.195940547, -0.967933494), (0.09599175, -0.964733798))
            ThreePointArc((0.09599175, -0.964733798), (0.056286672, -0.492404834), (-0.090835283, -0.041820466))
            Line((-0.090835283, -0.041820466), (1.8174e-05, 0.099999998))
            ThreePointArc((1.8174e-05, 0.099999998), (1.147728078, 0.099791416), (1.182455829, 0.099993046))
            Line((1.182455829, 0.099993046), (1.183635164, 0))
        make_face()
    extrude(amount=21.959087911, mode=Mode.SUBTRACT)
    with BuildSketch(Plane(origin=(-21.959087911, -11.852290077, -9), x_dir=(0, -0.19858553154825268, -0.98008356105982), z_dir=(1, 0, 0)), Plane(origin=(-21.959087911, 11.852290077, 9), x_dir=(0, 0.19858553154822475, 0.9800835610598256), z_dir=(1, 0, 0))) as fillet_3_piece_3:
        with BuildLine():
            CenterArc((1.217233349, -0.973269347), FILLET_3_R, 103.277447997, 87.490671362)
            Line((0.234841987, -1.160104066), (0.136602851, -1.178787538))
            ThreePointArc((0.136602851, -1.178787538), (0.129910229, -1.144710182), (-0.098008356, -0.019858553))
            Line((-0.098008356, -0.019858553), (0.022966667, 0.097326935))
            ThreePointArc((0.022966667, 0.097326935), (0.49378334, 0.042529095), (0.964600013, 0.097326935))
            Line((0.964600013, 0.097326935), (0.987566679, 0))
        make_face()
    extrude(amount=21.959087911, mode=Mode.SUBTRACT)
    with BuildSketch(Plane(origin=(-21.98900269, -7.946699797, -9), x_dir=(0, 1, 0), z_dir=(1, 0, 0)), Plane(origin=(-21.98900269, 7.946699797, 9), x_dir=(0, -1, 0), z_dir=(1, 0, 0))) as fillet_3_piece_4:
        with BuildLine():
            CenterArc((1.195601076, -1), FILLET_3_R, 90, 88.171589383)
            ThreePointArc((0.196110214, -0.968093631), (0.154403962, -0.472632025), (0, 0))
            Line((0, 0), (1.195601076, 0))
        make_face()
    extrude(amount=21.98900269, mode=Mode.SUBTRACT)

    # 草图7 → 切除-拉伸5 (cut)
    with BuildSketch(Plane(origin=(10, 0, 0), x_dir=(0, 0, -1), z_dir=(1, 0, 0))):
        with Locations((9.899494937, -9.899494937)):
            Circle(SKETCH_7_R)
    cut_extrude_5 = extrude(amount=-CUT_EXTRUDE_5_DEPTH, mode=Mode.SUBTRACT)

    # 阵列(圆周)1: 切除-拉伸5 ×4 about axis
    pattern_circular_1_axis = Axis((0, 0, 0), (1, 0, 0))
    for i in range(1, PATTERN_CIRCULAR_1_COUNT):
        add(cut_extrude_5.rotate(pattern_circular_1_axis, i * 360 / PATTERN_CIRCULAR_1_COUNT), mode=Mode.SUBTRACT)

    # 草图8 → 凸台-拉伸3 (add)
    with BuildSketch(Plane(origin=(10, 0, 0), x_dir=(0, 0, -1), z_dir=(1, 0, 0))):
        Rectangle(SKETCH_8_W, SKETCH_8_H)
    extrude(amount=EXTRUDE_3_DEPTH)

    # 草图9 → 切除-拉伸6 (cut)
    with BuildSketch(Plane(origin=(30, 0, 0), x_dir=(0, 0, -1), z_dir=(1, 0, 0))):
        Rectangle(SKETCH_9_W, SKETCH_9_H)
    extrude(amount=-CUT_EXTRUDE_6_DEPTH, mode=Mode.SUBTRACT)

    # 草图10 → 切除-拉伸7 (cut)
    with BuildSketch(Plane.ZY.offset(-1)):
        with Locations((0, 10.5)):
            Rectangle(SKETCH_10_W, SKETCH_10_H)
    extrude(amount=-CUT_EXTRUDE_7_DEPTH, mode=Mode.SUBTRACT)

    # 草图11 → 切除-拉伸8 (cut)
    with BuildSketch(Plane.ZY.offset(-1)):
        with Locations((0, 16)):
            Circle(SKETCH_11_R)
    extrude(amount=-CUT_EXTRUDE_8_DEPTH, mode=Mode.SUBTRACT)

    # 草图12 → 切除-拉伸9 (cut)
    with BuildSketch(Plane.XZ.offset(6.4)):
        with Locations(Location((20, 0.05, 0), (0, 0, 270))):
            Circle(SKETCH_12_R)
    extrude(amount=-CUT_EXTRUDE_9_DEPTH, mode=Mode.SUBTRACT)

    # 倒角1
    chamfer_1_edges = [part.edges().sort_by_distance(p)[0] for p in [
        (30, 0, 6.4),
        (30, -6.4, 0),
        (30, 0, -6.4),
        (30, 6.4, 0),
    ]]
    chamfer(chamfer_1_edges, length=CHAMFER_1_SIZE)

    # 圆角4
    fillet_4_edges = [part.edges().sort_by_distance(p)[0] for p in [
        (6, 3, 0),
    ]]
    fillet(fillet_4_edges, radius=FILLET_4_R)

    # 圆角5
    fillet_5_edges = [part.edges().sort_by_distance(p)[0] for p in [
        (19, -6.4, 6.4),
        (19, 6.4, 6.4),
        (19, 6.4, -6.4),
        (19, -6.4, -6.4),
    ]]
    fillet(fillet_5_edges, radius=FILLET_5_R)


solid = part.part
